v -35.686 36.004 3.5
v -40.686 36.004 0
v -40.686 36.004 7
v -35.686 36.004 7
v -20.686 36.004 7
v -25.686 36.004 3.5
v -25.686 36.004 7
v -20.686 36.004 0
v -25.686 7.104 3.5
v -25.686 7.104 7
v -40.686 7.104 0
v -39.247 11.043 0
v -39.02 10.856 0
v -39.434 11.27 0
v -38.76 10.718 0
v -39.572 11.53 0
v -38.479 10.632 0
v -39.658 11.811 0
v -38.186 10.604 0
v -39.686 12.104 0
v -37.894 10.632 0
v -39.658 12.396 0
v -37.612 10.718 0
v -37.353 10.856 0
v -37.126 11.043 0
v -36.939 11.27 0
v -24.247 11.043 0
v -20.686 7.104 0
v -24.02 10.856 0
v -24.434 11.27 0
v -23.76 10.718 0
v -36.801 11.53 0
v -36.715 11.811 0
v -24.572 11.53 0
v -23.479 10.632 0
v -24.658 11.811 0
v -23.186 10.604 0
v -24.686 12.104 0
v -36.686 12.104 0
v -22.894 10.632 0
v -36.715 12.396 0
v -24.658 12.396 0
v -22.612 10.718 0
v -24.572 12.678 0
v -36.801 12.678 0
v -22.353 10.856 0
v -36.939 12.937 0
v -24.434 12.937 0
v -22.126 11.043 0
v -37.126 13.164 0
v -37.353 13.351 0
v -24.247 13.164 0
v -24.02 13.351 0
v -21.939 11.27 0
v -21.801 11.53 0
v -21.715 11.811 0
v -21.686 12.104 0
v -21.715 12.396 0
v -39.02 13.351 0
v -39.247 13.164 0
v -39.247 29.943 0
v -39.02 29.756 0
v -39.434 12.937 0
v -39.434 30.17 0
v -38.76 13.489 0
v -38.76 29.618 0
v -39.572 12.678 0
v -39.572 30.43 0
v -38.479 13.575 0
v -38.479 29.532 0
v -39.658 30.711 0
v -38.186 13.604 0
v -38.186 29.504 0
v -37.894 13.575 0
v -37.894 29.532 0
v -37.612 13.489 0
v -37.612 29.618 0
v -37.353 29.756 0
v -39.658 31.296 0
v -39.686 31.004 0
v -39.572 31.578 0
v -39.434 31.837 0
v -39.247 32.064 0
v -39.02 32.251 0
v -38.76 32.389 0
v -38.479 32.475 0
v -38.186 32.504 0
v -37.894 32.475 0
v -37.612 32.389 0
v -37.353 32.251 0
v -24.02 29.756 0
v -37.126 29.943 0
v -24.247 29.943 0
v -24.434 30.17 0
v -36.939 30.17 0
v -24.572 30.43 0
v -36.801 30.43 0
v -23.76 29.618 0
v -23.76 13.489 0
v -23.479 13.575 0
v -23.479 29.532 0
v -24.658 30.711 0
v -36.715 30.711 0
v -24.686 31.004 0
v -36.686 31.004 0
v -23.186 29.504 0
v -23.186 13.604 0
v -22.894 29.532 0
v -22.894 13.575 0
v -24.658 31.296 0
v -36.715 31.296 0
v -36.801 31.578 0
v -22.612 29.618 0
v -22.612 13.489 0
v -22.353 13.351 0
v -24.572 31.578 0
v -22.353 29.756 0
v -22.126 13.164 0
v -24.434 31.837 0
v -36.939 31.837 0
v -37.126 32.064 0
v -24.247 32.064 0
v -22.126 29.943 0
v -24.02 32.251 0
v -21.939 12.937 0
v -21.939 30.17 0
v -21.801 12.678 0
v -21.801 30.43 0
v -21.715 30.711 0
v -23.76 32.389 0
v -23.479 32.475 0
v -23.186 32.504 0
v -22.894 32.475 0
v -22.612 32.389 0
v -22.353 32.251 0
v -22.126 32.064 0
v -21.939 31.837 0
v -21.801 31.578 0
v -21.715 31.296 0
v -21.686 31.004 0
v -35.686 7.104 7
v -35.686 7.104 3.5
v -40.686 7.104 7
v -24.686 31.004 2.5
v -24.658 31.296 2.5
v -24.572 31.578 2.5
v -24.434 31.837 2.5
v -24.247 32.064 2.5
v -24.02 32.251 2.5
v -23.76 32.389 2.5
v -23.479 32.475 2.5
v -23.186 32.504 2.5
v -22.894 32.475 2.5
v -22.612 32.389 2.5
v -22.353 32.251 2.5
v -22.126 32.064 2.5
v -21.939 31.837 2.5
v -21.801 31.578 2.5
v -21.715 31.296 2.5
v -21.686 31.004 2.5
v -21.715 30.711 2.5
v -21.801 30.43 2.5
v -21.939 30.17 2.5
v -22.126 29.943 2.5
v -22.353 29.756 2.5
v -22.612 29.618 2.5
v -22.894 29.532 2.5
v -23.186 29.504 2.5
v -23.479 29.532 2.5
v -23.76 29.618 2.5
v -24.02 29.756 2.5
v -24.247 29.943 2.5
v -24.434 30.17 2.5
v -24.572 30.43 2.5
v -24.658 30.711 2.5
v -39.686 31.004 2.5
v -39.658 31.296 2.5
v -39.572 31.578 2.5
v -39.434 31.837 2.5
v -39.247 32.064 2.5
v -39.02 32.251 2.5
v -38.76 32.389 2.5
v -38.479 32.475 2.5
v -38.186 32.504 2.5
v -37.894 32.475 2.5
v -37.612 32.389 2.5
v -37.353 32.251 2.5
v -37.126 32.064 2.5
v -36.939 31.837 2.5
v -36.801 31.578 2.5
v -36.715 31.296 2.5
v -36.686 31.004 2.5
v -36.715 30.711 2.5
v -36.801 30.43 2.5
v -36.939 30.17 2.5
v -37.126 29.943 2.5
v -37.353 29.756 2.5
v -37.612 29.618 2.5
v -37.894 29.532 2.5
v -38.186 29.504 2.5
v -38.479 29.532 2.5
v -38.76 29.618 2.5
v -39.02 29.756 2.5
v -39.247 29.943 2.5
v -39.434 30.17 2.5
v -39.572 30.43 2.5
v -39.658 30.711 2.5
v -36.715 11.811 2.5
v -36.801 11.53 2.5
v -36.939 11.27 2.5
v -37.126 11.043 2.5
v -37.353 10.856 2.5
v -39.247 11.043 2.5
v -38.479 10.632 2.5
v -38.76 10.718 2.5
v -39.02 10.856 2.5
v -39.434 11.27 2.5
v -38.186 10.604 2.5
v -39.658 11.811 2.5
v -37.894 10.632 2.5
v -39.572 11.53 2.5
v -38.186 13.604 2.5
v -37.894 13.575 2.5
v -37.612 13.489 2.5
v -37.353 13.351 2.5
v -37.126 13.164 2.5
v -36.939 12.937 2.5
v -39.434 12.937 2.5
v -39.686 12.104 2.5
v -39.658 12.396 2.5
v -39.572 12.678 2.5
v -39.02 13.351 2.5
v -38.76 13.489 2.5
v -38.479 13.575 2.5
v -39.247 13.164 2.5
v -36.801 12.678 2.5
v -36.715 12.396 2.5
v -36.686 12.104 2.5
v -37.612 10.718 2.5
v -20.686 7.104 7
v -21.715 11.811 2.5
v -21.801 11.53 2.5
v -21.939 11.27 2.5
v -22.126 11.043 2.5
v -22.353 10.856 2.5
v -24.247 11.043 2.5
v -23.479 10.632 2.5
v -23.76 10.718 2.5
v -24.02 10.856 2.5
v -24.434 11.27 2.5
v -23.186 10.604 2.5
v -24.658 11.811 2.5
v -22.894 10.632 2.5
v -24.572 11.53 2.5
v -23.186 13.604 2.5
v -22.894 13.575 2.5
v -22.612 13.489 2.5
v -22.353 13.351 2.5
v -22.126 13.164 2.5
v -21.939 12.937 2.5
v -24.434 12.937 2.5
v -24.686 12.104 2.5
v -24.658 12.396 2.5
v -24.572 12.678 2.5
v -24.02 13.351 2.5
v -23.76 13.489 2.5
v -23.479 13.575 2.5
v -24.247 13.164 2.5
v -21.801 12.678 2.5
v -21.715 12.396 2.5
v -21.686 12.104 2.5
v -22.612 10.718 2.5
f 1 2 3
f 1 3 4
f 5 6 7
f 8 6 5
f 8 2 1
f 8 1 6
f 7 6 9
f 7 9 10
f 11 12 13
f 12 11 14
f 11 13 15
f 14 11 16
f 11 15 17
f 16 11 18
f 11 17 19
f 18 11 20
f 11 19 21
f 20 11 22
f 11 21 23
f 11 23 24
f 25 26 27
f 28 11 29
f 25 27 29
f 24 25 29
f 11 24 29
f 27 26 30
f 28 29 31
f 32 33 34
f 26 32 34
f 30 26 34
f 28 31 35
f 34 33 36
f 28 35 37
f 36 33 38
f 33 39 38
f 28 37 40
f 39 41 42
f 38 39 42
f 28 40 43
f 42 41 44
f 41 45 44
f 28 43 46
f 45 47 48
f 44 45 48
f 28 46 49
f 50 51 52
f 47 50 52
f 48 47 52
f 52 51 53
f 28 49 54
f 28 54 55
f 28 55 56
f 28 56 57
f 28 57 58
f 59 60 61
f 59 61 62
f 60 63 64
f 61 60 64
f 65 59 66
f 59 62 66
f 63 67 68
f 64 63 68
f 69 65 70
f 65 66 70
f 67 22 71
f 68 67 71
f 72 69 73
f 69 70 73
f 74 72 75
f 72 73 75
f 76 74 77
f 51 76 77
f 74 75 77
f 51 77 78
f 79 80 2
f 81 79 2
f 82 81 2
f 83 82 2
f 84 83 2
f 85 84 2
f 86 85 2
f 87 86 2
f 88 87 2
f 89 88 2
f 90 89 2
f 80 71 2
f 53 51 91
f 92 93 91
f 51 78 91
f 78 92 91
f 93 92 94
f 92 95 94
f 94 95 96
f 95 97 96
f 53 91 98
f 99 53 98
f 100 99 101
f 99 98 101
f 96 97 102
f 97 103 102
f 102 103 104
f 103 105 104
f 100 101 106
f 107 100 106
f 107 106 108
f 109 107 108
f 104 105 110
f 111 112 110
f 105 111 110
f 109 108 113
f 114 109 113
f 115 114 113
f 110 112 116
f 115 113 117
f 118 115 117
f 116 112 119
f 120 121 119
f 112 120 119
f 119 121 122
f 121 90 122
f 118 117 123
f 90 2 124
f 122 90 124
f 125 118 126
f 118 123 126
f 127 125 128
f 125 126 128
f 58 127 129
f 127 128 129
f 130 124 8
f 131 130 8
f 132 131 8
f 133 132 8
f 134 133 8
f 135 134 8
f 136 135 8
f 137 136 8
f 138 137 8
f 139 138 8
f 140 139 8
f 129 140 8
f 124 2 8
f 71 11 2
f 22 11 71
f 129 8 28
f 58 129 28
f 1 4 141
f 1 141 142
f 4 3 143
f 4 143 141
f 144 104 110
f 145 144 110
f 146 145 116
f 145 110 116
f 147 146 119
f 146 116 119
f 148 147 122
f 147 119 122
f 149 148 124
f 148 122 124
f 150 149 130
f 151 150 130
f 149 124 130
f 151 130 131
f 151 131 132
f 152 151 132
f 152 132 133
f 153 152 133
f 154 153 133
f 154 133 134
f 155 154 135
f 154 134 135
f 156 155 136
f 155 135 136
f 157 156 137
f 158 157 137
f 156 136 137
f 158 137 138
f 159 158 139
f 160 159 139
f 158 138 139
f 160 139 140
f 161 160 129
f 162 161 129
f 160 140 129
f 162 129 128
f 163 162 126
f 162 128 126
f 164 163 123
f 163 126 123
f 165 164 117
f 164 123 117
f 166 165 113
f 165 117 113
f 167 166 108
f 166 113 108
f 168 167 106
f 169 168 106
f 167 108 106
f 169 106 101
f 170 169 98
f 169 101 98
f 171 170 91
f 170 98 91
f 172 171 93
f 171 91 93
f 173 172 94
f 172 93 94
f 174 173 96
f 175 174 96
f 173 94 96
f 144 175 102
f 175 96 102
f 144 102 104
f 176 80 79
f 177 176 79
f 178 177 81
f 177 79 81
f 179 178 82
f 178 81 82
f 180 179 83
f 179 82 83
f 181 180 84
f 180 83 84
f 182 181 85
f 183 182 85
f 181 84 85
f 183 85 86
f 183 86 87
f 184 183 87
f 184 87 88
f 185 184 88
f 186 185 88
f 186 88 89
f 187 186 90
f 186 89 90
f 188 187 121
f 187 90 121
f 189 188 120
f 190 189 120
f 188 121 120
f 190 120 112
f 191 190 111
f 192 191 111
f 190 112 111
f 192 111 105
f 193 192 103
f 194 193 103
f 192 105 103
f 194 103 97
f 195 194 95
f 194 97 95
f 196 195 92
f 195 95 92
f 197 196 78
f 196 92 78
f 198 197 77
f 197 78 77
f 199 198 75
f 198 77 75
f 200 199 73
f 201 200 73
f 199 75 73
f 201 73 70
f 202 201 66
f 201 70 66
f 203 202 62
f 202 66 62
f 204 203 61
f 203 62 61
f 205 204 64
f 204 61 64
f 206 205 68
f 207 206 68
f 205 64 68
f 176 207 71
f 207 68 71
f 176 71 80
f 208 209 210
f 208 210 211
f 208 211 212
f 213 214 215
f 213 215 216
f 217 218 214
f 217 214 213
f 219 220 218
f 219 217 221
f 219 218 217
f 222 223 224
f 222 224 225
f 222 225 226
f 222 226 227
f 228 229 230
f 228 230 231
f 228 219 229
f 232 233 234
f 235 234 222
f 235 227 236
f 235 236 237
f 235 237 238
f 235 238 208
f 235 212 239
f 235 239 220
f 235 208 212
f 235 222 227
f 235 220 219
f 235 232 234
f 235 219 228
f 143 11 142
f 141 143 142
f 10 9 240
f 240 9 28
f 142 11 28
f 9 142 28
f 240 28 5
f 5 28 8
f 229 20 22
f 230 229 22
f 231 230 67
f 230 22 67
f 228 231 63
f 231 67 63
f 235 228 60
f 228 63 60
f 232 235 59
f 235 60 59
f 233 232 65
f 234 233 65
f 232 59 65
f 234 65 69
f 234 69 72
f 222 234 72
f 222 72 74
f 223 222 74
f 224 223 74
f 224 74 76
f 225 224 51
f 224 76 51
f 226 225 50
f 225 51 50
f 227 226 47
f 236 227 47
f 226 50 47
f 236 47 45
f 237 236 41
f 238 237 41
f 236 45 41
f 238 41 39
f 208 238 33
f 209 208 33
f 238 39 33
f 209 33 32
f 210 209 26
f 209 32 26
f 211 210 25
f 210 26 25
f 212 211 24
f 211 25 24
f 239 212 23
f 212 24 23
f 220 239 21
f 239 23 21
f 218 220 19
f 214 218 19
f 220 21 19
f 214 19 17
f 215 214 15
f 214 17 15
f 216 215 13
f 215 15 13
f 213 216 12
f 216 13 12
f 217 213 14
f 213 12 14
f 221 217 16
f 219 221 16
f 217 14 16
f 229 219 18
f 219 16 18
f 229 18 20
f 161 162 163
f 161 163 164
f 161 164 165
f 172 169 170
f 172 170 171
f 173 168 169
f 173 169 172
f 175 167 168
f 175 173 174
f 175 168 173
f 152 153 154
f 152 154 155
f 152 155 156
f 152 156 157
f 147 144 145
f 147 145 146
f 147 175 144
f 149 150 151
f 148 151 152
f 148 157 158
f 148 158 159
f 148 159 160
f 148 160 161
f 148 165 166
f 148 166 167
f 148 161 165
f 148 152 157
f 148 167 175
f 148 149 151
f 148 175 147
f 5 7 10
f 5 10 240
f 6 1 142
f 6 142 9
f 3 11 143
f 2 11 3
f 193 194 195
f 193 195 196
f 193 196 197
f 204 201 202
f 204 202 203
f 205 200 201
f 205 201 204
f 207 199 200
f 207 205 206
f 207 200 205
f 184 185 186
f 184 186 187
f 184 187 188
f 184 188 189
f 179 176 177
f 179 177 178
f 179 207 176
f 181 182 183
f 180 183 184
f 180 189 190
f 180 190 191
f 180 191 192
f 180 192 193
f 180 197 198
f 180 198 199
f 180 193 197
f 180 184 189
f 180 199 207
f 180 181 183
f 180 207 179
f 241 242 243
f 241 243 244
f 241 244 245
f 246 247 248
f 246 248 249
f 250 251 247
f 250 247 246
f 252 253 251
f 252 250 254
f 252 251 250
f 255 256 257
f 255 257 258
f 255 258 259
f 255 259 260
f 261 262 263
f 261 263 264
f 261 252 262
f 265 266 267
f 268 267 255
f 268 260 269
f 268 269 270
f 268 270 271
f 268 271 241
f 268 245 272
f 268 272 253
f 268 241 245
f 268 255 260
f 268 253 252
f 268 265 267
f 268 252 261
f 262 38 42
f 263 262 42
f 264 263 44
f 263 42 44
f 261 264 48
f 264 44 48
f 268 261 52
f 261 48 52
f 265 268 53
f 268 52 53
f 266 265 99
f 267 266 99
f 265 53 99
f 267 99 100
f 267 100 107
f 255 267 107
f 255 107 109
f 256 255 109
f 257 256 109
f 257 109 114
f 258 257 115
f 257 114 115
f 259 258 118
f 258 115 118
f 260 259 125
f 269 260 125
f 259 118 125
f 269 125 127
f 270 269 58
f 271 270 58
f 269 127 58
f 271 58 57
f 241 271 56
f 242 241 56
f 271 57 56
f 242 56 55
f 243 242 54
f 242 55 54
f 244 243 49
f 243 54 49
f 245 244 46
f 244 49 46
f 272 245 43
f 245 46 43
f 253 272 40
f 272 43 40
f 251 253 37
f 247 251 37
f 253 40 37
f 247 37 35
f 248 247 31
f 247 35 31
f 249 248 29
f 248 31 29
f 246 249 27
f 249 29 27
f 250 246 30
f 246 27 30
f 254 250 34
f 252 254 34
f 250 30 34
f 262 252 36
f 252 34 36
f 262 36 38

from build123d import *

# Parameters (mm, degrees)
SKETCH_1_W          = 20
SKETCH_1_H          = 28.9
EXTRUDE_1_DEPTH     = 7
CUT_EXTRUDE_1_DEPTH = 30.5
SKETCH_3_R          = 1.5
CUT_EXTRUDE_2_DEPTH = 2.5


with BuildPart() as part:
    # 草图1 → 凸台-拉伸1 (new body)
    with BuildSketch(Plane.XY):
        with Locations((-30.686463881, 21.553540909)):
            Rectangle(SKETCH_1_W, SKETCH_1_H)
    extrude(amount=EXTRUDE_1_DEPTH)

    # 草图2 → 切除-拉伸1 (cut)
    with BuildSketch(Plane(origin=(0, 36.003540909, 0), x_dir=(1, 0, 0), z_dir=(0, 1, 0))):
        Polygon((-30.686463881, -7), (-35.686463881, -7), (-35.686463881, -3.5), (-25.686463881, -3.5), (-25.686463881, -7), align=None)
    extrude(amount=-CUT_EXTRUDE_1_DEPTH, mode=Mode.SUBTRACT)

    # 草图3 → 切除-拉伸2 (cut)
    with BuildSketch(Plane(origin=(0, 0, 0), x_dir=(-1, 0, 0), z_dir=(0, 0, -1))):
        with Locations((23.186463881, 31.003540909)):
            Circle(SKETCH_3_R)
        with Locations((38.186463881, 31.003540909)):
            Circle(SKETCH_3_R)
        with Locations((38.186463881, 12.103540909)):
            Circle(SKETCH_3_R)
        with Locations((23.186463881, 12.103540909)):
            Circle(SKETCH_3_R)
    extrude(amount=-CUT_EXTRUDE_2_DEPTH, mode=Mode.SUBTRACT)


solid = part.part
